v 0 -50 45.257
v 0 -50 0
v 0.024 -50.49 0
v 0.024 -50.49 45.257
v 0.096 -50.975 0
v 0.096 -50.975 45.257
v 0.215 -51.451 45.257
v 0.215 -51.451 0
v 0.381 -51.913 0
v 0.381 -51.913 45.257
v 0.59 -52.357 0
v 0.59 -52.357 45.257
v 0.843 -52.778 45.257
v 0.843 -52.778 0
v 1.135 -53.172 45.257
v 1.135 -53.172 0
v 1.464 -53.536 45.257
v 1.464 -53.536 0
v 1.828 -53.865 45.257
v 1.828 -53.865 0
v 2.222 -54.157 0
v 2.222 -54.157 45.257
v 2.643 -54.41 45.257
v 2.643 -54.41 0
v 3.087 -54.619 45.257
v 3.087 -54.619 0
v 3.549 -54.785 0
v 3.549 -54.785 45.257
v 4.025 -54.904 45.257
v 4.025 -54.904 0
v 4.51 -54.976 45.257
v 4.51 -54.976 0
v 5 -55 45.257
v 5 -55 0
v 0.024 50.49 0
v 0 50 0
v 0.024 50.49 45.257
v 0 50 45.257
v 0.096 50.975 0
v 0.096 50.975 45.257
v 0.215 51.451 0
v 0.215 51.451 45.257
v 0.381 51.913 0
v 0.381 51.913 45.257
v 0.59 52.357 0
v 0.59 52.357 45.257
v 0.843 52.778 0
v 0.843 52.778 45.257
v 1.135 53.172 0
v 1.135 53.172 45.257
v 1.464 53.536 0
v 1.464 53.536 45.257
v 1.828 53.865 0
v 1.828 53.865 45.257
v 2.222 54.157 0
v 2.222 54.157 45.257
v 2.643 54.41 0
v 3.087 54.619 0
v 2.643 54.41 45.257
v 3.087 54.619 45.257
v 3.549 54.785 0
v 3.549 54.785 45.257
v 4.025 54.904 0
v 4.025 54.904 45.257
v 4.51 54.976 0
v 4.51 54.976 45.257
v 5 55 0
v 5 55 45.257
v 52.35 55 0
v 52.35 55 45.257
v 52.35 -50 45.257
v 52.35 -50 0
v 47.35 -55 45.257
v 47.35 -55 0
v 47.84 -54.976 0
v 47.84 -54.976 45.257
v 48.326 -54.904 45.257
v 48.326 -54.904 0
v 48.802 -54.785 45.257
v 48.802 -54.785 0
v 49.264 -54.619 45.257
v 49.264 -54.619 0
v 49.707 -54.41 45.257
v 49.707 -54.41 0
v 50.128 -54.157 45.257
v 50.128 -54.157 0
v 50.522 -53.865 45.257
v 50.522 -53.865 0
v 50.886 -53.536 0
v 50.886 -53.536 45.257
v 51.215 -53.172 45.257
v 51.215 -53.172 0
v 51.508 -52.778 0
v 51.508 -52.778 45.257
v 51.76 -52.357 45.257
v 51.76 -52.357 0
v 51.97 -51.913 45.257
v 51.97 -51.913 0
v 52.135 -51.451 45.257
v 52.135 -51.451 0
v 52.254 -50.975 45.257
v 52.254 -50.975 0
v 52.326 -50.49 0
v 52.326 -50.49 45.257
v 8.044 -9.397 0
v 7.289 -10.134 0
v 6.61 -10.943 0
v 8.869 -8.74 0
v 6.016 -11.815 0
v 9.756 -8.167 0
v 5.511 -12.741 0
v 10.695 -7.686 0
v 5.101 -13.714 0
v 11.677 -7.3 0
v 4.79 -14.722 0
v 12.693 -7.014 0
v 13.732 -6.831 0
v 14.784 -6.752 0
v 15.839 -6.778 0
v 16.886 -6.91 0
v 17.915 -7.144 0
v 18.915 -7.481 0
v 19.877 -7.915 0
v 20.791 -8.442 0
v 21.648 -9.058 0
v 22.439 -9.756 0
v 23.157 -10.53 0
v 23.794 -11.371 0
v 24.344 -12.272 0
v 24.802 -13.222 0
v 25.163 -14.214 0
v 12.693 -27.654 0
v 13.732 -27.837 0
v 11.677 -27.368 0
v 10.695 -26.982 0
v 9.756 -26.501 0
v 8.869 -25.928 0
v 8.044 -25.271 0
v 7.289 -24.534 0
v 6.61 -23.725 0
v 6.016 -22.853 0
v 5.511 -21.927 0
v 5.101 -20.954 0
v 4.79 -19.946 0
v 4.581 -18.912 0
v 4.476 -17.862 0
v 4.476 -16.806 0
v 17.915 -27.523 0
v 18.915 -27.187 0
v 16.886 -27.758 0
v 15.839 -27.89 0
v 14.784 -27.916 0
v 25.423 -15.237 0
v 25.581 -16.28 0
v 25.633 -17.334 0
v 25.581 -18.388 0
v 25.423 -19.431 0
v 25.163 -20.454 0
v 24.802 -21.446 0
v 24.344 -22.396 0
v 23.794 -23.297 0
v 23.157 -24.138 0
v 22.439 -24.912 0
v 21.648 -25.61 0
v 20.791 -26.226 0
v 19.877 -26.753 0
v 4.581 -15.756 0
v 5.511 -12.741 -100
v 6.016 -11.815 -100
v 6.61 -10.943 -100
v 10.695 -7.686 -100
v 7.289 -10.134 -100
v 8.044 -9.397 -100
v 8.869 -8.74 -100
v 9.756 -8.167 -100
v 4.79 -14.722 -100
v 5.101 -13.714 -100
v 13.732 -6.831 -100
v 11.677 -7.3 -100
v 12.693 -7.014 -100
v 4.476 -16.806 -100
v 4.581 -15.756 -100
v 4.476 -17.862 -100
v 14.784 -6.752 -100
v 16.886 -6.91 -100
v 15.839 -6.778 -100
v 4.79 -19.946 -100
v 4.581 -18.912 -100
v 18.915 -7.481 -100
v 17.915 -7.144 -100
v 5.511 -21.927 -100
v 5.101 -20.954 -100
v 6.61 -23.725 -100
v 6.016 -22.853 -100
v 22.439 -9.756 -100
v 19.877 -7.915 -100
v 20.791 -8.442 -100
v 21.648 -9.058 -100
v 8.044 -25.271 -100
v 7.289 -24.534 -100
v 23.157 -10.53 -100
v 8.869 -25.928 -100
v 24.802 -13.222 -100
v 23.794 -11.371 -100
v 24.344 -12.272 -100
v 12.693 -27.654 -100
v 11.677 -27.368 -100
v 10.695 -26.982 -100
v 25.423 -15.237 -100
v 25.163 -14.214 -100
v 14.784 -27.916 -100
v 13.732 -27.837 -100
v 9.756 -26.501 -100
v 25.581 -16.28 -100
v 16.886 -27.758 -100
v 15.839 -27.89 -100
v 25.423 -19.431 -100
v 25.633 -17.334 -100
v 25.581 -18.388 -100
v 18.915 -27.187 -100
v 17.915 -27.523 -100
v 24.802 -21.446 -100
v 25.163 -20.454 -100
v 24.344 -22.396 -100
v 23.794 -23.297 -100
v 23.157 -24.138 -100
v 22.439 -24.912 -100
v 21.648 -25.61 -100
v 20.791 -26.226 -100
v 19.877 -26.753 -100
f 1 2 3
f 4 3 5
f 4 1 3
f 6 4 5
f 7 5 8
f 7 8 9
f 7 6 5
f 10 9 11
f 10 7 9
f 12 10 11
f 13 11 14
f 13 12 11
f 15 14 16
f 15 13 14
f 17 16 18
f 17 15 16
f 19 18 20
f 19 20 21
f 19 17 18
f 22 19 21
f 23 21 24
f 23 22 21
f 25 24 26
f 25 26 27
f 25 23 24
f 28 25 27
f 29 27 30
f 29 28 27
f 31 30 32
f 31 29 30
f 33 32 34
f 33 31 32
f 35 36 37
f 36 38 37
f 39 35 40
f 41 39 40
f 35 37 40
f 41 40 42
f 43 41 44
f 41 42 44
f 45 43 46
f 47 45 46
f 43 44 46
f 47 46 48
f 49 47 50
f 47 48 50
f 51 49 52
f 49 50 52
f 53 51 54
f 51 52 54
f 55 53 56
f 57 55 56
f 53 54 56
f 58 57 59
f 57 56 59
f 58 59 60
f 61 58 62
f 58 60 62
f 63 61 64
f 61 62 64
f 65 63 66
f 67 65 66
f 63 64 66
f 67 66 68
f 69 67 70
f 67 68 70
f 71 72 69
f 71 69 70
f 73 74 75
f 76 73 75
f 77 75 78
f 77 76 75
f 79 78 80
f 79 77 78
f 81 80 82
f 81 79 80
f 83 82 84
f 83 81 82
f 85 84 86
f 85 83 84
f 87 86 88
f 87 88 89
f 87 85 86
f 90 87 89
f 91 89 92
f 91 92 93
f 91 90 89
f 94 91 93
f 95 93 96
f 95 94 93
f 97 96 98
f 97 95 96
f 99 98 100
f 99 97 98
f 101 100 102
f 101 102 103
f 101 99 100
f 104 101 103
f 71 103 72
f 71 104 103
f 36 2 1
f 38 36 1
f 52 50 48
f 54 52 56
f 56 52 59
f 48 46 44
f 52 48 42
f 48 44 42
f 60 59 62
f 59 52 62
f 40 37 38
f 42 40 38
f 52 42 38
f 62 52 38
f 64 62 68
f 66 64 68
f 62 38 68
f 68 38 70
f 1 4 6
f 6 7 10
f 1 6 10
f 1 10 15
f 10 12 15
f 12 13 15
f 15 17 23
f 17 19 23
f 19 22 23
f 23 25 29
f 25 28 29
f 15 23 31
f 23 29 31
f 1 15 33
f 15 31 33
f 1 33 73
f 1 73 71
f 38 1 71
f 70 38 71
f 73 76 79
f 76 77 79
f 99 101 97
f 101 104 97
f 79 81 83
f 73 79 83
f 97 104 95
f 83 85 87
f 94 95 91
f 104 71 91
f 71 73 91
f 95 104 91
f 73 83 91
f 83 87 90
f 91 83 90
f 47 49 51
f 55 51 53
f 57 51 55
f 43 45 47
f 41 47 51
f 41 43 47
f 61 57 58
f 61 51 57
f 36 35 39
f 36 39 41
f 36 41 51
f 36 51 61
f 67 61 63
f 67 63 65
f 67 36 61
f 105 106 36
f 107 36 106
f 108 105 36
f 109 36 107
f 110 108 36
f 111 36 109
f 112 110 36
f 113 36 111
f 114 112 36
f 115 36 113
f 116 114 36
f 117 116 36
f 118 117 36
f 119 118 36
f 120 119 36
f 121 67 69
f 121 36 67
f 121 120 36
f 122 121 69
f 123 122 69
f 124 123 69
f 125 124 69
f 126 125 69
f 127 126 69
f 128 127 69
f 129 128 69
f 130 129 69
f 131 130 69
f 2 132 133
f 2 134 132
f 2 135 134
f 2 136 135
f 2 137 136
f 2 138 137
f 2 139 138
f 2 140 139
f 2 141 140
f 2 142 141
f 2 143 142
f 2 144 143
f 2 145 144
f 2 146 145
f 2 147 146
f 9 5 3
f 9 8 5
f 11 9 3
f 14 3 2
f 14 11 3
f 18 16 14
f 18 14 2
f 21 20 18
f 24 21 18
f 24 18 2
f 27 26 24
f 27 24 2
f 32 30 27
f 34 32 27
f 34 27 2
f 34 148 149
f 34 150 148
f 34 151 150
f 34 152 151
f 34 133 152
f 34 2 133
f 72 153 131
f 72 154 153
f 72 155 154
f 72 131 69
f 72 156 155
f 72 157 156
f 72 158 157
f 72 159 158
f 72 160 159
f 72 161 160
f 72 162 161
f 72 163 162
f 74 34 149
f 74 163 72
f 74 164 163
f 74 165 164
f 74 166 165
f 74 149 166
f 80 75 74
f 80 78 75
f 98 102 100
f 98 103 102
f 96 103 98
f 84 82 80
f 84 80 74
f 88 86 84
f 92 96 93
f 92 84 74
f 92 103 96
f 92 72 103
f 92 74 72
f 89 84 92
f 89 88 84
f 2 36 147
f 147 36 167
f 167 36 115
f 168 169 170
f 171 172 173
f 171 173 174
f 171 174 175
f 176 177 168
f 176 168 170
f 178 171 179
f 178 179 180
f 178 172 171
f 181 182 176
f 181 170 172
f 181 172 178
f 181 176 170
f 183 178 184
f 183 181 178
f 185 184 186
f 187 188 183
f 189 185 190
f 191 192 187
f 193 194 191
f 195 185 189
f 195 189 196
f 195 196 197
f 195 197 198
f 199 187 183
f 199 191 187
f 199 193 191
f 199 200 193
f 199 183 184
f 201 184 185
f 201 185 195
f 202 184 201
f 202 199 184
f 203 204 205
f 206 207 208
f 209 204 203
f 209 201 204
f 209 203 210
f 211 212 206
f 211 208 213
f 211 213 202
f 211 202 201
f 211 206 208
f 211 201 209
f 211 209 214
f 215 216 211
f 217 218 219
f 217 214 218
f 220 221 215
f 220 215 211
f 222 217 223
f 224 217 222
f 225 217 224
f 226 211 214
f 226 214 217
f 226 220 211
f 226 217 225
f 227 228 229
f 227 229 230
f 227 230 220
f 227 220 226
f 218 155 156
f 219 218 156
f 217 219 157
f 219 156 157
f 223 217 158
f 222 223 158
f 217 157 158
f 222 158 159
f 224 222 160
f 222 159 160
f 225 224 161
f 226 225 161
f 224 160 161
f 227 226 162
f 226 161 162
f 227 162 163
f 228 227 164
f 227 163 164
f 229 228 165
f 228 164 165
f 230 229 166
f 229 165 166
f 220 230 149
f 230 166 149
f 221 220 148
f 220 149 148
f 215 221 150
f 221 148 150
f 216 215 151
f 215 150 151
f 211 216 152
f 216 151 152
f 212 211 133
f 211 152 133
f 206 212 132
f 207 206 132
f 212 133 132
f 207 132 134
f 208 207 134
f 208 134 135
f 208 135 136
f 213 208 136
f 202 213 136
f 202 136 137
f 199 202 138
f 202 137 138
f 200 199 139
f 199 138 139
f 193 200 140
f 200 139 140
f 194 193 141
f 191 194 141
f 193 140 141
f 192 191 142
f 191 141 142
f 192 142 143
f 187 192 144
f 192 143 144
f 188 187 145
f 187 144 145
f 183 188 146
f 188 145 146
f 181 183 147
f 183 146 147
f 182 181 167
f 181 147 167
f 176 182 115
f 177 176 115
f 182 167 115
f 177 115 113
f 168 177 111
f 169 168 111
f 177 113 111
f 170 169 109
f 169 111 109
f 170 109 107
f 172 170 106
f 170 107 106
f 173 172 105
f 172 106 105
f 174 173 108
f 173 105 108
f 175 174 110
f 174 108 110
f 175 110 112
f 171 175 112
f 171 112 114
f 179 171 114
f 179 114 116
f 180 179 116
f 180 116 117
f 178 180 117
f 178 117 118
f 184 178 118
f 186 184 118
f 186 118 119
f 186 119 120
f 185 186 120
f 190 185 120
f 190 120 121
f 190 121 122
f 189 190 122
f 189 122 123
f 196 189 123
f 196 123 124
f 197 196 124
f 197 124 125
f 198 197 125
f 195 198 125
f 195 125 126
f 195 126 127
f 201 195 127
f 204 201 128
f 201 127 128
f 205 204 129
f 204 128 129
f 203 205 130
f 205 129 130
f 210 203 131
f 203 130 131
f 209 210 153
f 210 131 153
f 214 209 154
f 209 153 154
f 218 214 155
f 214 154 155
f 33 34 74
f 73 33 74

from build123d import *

# Parameters (mm, degrees)
F0_W     = 52.350345999
F0_H     = 45.2565550804
F1_DEPTH = 55
F2_R     = 5
F3_R     = 10.5851243618
F4_DEPTH = 100


with BuildPart() as f1:
    # F0 (on Front) → F1 (new body, symmetric)
    with BuildSketch(Plane.XZ):
        with Locations((26.1751729995, 22.6282775402)):
            Rectangle(F0_W, F0_H)
    extrude(amount=F1_DEPTH, both=True)

    # F2
    f2_edges = [f1.edges().sort_by_distance(p)[0] for p in [
        (52.350346, -55, 22.628278),
        (0, -55, 22.628278),
        (0, 55, 22.628278),
    ]]
    fillet(f2_edges, radius=F2_R)

    # F3 (on face) → F4 (join)
    with BuildSketch(Plane(origin=(0, 0, 0), x_dir=(1, 0, 0), z_dir=(0, 0, -1))):
        with Locations((15.048192814, 17.3339936882)):
            Circle(F3_R)
    extrude(amount=F4_DEPTH)


solid = f1.part
